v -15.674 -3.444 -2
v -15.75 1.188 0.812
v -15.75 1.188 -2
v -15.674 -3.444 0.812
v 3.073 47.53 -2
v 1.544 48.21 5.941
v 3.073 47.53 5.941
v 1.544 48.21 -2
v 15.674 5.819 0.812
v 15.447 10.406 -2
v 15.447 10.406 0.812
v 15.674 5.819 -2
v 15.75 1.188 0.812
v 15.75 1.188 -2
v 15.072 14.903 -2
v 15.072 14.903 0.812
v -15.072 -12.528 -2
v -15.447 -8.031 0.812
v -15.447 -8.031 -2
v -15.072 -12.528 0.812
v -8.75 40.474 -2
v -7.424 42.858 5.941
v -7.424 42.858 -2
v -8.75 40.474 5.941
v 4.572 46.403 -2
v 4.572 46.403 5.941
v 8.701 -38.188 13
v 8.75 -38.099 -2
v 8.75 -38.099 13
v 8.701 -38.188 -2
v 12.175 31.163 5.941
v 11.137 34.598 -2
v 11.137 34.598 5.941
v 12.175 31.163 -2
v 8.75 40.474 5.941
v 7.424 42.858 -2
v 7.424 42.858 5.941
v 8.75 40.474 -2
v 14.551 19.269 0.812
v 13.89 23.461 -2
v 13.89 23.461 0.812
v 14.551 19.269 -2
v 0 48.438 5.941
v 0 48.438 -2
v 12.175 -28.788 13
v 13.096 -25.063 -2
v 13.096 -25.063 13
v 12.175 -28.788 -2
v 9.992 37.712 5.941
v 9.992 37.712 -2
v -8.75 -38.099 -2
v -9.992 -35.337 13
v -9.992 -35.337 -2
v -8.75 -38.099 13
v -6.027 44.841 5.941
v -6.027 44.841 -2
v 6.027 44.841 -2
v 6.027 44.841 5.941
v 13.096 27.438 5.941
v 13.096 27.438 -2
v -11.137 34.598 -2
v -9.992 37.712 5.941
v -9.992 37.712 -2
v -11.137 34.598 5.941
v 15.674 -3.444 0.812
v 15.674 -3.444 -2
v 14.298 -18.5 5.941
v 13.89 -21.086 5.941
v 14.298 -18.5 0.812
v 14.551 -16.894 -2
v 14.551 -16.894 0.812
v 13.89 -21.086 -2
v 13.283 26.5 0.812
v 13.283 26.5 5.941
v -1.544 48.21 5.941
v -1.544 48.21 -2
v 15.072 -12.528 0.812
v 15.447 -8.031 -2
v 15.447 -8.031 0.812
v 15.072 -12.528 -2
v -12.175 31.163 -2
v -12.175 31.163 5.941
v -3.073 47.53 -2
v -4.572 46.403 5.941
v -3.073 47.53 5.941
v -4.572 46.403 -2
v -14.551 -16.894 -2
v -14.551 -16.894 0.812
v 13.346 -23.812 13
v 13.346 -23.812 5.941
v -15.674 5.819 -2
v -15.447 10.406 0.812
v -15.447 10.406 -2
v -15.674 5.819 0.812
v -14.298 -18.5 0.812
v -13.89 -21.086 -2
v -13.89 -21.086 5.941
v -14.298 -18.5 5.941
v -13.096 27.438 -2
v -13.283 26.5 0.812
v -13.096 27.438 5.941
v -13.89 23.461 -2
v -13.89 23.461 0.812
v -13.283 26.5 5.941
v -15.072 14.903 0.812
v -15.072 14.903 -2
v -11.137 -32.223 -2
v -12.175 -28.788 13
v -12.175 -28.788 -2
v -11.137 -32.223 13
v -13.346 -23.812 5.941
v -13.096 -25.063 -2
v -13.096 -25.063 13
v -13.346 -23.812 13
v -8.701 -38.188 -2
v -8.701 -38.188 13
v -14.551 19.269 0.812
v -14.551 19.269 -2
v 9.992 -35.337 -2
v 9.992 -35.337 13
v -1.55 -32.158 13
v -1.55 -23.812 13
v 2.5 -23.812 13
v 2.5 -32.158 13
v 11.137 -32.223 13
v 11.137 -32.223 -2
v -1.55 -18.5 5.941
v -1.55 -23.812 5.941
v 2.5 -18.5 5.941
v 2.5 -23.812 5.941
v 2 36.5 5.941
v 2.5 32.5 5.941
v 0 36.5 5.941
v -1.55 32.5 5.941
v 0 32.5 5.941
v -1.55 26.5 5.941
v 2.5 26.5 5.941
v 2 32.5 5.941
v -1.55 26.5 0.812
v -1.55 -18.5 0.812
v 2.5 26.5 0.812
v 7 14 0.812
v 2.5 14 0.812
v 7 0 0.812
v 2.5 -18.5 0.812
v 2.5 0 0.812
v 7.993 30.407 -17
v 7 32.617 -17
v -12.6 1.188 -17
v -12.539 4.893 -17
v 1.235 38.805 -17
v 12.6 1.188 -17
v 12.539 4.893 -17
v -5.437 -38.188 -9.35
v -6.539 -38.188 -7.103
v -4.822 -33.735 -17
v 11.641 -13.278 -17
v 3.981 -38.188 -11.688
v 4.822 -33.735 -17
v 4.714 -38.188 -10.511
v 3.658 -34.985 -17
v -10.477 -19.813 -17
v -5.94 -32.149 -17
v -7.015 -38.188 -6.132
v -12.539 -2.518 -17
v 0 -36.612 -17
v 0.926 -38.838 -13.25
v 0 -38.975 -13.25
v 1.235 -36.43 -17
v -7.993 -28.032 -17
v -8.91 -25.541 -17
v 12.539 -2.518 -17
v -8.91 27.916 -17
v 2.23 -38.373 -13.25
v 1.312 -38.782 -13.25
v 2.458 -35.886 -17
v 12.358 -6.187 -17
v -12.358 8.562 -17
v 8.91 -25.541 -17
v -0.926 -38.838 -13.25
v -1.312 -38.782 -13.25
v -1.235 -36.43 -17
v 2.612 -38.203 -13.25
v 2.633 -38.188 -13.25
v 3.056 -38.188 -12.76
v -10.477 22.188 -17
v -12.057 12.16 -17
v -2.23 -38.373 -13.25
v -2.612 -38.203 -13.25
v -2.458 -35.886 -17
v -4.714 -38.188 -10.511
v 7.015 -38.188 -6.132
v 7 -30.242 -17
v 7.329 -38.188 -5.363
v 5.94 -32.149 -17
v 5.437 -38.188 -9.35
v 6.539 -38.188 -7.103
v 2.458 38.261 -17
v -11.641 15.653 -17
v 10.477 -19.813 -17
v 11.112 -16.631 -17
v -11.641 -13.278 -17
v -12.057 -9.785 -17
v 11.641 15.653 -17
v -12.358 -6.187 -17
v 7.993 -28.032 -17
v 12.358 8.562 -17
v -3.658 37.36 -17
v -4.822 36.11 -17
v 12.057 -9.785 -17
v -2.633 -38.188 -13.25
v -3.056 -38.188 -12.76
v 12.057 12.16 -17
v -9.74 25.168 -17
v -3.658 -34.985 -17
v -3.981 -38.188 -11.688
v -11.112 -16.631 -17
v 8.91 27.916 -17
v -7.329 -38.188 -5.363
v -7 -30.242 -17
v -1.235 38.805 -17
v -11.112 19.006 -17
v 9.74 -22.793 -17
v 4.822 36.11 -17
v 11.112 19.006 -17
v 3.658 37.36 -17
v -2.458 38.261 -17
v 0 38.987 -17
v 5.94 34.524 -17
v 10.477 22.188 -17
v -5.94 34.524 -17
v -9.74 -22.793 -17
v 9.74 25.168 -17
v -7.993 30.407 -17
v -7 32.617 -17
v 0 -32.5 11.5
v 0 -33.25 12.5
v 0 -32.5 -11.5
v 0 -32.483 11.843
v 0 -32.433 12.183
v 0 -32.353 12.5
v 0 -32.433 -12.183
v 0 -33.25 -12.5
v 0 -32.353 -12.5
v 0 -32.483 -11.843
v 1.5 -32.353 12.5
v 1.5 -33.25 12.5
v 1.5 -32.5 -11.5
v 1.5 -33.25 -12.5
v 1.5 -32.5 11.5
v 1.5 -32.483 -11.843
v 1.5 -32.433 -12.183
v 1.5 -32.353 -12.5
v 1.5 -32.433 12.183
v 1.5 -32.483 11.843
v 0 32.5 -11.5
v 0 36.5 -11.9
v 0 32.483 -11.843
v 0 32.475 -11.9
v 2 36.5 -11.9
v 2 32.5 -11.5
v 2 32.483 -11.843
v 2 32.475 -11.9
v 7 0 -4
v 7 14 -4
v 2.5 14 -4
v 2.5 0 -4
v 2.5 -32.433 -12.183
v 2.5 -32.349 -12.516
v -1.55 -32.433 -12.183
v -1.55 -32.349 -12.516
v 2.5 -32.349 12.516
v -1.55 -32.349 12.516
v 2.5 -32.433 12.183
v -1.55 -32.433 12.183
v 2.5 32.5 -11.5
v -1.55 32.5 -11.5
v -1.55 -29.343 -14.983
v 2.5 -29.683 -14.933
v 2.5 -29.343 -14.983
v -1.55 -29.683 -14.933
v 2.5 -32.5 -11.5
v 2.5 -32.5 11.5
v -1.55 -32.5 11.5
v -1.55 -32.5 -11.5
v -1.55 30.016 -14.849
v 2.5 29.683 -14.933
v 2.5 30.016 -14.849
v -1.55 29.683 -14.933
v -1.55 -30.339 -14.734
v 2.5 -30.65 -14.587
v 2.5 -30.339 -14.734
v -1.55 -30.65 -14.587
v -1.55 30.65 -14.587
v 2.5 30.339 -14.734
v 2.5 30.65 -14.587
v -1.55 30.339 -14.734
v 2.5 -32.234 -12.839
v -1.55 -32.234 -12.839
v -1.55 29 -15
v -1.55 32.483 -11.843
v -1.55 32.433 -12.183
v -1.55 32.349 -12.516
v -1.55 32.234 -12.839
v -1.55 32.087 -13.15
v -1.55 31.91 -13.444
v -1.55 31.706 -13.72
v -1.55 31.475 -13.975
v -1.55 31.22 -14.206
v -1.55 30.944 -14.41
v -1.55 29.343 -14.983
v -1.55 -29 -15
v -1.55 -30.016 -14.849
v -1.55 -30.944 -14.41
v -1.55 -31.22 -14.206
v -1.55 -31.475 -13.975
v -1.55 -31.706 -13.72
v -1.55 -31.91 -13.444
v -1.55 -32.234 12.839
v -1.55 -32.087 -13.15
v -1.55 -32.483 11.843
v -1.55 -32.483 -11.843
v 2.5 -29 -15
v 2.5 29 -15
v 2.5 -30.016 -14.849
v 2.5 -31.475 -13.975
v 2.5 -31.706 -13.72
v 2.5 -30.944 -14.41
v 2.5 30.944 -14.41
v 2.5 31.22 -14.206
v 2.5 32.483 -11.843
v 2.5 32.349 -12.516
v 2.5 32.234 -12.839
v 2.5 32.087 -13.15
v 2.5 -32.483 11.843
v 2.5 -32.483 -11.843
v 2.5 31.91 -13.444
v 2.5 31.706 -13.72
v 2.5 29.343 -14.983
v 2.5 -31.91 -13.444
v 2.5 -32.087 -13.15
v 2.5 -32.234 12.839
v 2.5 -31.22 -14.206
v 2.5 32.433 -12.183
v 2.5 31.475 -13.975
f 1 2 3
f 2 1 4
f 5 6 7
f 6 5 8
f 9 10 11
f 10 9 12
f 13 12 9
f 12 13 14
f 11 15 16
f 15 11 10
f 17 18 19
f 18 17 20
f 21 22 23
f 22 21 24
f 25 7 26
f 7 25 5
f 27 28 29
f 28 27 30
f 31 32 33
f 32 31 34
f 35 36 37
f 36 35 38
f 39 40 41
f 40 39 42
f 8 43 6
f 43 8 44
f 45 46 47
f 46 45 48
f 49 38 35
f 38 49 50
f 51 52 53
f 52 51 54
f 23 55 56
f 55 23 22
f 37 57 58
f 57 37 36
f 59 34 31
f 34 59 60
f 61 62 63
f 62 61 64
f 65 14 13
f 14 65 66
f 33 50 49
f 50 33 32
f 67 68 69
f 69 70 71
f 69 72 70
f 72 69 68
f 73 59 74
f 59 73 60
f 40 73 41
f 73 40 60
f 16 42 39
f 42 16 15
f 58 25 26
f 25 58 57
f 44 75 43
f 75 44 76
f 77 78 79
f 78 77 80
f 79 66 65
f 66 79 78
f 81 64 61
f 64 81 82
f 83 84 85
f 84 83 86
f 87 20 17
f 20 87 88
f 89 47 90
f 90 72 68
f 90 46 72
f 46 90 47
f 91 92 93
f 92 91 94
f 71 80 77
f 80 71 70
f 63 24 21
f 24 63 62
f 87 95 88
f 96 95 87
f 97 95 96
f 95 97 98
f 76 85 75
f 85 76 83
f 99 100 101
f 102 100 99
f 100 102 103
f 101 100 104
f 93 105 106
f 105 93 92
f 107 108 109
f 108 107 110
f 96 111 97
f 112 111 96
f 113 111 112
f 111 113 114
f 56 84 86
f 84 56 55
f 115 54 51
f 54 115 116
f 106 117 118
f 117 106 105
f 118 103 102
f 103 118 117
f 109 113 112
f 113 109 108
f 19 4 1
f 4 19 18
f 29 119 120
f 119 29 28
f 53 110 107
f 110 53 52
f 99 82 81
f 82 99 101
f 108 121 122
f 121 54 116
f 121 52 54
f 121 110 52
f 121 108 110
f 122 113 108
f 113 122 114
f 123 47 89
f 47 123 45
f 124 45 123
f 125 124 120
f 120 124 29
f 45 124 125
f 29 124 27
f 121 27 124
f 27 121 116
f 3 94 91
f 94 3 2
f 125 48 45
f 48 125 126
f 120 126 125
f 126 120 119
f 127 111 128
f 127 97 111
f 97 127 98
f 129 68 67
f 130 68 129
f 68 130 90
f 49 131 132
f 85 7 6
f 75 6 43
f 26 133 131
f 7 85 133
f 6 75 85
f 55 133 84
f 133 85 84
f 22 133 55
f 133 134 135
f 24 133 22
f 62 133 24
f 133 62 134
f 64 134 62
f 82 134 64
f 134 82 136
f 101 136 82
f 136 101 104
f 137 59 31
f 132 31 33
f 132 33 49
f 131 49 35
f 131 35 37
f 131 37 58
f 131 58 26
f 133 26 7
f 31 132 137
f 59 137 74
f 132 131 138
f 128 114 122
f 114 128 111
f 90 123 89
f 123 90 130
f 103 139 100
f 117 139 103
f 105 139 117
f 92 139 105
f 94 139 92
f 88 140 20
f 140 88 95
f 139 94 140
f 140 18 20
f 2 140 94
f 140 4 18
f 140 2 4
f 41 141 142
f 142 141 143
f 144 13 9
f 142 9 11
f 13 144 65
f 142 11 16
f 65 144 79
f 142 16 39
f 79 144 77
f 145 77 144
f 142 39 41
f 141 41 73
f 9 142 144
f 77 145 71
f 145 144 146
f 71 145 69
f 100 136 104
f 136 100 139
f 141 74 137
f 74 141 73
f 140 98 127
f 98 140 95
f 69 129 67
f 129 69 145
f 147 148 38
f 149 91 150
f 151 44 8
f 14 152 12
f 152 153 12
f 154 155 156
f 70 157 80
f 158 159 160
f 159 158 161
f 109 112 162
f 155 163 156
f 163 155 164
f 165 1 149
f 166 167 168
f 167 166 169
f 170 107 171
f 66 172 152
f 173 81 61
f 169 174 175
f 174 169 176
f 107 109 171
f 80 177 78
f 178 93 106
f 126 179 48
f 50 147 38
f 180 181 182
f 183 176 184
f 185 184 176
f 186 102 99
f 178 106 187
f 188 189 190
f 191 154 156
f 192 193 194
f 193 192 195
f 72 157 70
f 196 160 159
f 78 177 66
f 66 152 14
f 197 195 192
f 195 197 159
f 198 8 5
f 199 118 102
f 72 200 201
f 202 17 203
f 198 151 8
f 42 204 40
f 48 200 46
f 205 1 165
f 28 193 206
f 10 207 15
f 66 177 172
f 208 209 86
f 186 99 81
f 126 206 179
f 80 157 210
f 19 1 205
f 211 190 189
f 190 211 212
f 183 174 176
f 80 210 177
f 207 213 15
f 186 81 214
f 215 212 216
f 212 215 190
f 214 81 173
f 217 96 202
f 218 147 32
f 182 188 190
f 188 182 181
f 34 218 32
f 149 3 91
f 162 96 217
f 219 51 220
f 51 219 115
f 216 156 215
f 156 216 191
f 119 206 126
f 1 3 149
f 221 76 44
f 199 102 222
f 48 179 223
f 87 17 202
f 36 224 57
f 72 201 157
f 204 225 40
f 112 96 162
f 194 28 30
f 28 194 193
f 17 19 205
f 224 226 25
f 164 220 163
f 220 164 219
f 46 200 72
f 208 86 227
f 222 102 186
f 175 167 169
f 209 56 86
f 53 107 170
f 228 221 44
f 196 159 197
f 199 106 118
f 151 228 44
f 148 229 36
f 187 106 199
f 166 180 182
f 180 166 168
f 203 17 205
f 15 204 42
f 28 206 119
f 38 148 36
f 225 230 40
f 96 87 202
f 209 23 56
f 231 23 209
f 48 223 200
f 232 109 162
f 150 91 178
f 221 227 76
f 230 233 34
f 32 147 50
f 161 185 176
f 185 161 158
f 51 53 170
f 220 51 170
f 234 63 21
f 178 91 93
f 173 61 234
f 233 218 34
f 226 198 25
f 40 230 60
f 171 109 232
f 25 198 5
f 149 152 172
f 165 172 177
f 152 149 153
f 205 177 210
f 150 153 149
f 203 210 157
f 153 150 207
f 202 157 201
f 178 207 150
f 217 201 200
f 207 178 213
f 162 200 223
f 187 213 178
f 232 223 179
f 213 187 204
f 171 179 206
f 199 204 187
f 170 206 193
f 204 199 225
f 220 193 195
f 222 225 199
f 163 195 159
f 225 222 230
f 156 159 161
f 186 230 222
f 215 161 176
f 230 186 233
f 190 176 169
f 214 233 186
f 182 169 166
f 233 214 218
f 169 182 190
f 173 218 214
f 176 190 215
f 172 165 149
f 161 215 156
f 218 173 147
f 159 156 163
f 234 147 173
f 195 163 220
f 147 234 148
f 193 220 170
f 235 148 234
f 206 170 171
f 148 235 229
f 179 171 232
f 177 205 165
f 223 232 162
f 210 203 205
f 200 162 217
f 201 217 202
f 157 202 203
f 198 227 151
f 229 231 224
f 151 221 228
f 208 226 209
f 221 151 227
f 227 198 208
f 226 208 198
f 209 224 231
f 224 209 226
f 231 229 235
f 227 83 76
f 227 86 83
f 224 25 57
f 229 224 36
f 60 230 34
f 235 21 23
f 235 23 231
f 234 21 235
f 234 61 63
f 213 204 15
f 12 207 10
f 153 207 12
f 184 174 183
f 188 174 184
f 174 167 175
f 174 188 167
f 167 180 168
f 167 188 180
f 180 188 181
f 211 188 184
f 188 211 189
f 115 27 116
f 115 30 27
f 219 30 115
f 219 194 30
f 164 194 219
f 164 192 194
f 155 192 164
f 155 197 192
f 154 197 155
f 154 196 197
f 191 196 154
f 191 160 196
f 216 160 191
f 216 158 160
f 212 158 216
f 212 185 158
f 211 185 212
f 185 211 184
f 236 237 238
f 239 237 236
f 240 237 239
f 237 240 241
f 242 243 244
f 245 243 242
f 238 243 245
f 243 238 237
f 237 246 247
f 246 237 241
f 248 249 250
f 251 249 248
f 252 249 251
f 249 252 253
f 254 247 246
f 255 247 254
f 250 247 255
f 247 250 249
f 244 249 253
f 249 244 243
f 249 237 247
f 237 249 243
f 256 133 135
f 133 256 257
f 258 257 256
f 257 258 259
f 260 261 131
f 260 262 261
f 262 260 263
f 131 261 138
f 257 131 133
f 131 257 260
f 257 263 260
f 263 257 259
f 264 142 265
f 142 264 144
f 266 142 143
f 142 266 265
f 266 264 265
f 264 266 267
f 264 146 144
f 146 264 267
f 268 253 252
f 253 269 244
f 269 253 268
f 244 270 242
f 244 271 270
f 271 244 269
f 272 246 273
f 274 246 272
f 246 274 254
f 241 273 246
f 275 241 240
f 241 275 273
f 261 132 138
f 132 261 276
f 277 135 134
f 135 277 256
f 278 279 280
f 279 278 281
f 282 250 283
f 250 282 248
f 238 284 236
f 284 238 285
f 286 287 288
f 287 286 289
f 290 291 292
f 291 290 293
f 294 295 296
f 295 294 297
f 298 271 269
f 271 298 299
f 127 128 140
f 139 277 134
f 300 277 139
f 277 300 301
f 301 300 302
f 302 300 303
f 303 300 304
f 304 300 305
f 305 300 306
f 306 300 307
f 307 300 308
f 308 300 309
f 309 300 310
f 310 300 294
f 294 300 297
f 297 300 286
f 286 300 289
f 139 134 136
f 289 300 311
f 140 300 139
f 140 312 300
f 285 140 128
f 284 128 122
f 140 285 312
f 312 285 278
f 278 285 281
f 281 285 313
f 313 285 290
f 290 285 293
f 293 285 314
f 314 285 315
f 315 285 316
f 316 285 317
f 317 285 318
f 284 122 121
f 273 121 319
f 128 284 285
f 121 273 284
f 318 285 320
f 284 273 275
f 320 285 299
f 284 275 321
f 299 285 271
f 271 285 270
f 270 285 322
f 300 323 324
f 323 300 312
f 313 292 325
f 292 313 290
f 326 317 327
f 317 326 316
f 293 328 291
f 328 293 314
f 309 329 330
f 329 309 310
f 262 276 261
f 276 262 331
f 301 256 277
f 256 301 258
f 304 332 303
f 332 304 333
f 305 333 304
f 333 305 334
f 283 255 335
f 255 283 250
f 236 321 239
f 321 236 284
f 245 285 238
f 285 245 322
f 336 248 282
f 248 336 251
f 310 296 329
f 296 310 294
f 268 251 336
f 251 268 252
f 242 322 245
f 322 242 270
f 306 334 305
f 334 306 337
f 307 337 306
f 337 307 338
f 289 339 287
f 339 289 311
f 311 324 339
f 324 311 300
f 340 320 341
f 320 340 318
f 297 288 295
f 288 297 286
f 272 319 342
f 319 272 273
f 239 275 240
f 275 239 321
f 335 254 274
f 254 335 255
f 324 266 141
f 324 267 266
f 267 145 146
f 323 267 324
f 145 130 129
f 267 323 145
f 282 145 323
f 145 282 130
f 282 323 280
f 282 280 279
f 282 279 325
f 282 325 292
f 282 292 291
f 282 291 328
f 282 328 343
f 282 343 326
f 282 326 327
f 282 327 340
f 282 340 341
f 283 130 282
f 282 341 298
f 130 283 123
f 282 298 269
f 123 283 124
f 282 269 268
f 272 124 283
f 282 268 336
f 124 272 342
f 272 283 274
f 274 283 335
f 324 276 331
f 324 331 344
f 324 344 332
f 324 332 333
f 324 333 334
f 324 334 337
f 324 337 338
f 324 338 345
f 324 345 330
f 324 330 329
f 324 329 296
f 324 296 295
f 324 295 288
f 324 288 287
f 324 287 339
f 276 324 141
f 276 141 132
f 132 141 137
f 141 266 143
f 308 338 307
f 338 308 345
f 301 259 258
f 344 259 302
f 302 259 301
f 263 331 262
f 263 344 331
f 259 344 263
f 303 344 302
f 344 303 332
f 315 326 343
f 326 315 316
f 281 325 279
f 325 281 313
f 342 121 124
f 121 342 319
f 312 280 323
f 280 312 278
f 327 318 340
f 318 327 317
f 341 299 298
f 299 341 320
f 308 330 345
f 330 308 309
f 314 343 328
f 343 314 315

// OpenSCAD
// file: pi-zero.scad
include <rounded-rect.scad>;

// piZero();

module piZero(includeCables = true, includeHeatsink = true, heightPadding = 0, sdWidth = 12, cameraWidth = 17, printerTolerance = 0) {
    // base board
    color("green")
        linear_extrude(0, 0, 1.55 + 2 + heightPadding + printerTolerance)
            difference() {
                roundedRect(30 + 2 * printerTolerance, 65 + 2 * printerTolerance, 3.5 -printerTolerance);
                *union() {
                    translate([11.5 + printerTolerance, 29 + printerTolerance, 0]) circle(r = 1.25 - printerTolerance);
                    translate([-11.5 - printerTolerance, 29 + printerTolerance, 0]) circle(r = 1.25 - printerTolerance);
                    translate([11.5 + printerTolerance, -29 - printerTolerance, 0]) circle(r = 1.25 - printerTolerance);
                    translate([-11.5 - printerTolerance, -29 - printerTolerance, 0]) circle(r = 1.25 - printerTolerance);
                };
            };
    // top stuff
    translate([0, 0, 1.55 + printerTolerance])
        color("cyan")
            union() {
                // camera port cover
                linear_extrude(0, 0, 1 + heightPadding + printerTolerance)
                    translate([0, -32.5 - printerTolerance, 0])
                        square([cameraWidth + 2 * printerTolerance, 1.5 + 2 * printerTolerance], center = true);
                // micro usb ports
                translate([-10, -8.9, 1])
                    rotate([0, -90, 0])
                        linear_extrude(0, 0, 6)
                            square([2 + 2 * printerTolerance, 8 + 2 * printerTolerance], center = true);
                translate([-10, -21.5, 1])
                    rotate([0, -90, 0])
                        linear_extrude(0, 0, 6)
                            square([2 + 2 * printerTolerance, 8 + 2 * printerTolerance], center = true);
                // micro usb port things
                if (includeCables) {
                    translate([-15, -8.9, 1])
                        rotate([0, -90, 0])
                            linear_extrude(0, 0, 8)
                                roundedRect(8, 11, 1);
                    translate([-15, -21.5, 1])
                        rotate([0, -90, 0])
                            linear_extrude(0, 0, 8)
                                roundedRect(8, 11, 1);
                }
                // micro hdmi port
                translate([-7, 20.1, 1.7])
                    rotate([0, -90, 0])
                        linear_extrude(0, 0, 9.5)
                            square([3.4 + 2 * printerTolerance, 11.5 + 2 * printerTolerance], center = true);
                // micro hdmi adapter
                if (includeCables) {
                    translate([-15, 20.1, 1.7])
                        rotate([0, -90, 0])
                            linear_extrude(0, 0, 9.5)
                                roundedRect(9 + 2 * printerTolerance, 14 + 2* printerTolerance, 2);
                }
                
                // microsd card
                translate([1.9, 28, 0])
                    linear_extrude(0, 0, 1.5 + heightPadding)
                        square([sdWidth + 2 * printerTolerance, 17 + 2 * printerTolerance], center = true);
                // cpu heatsink
                translate([-3, 32.5 - 18.5 - 7, 0])
                    linear_extrude(0, 0, 7)
                        square([14, 14], center = true);
            };
}
// file: rounded-rect.scad
$fn = 16;

// linear_extrude(0, 0, 1) roundedRect(10, 20, 2);

module roundedRect(w, h, r) {
    square([w - 2 * r, h], center = true);
    square([w, h - 2 * r], center = true);
    translate([w/2 - r, h/2 - r, 0]) circle(r = r);
    translate([-(w/2 - r), h/2 - r, 0]) circle(r = r);
    translate([w/2 - r, -(h/2 - r), 0]) circle(r = r);
    translate([-(w/2 - r), -(h/2 - r), 0]) circle(r = r);
}
// main file
include <rounded-rect.scad>;
include <pi-zero.scad>;

printerTolerance = 0.3;
$fn = 64;

// pi zero, horizontally
//difference() {
//    union() {
//        linear_extrude(0, 0, 3)
//            roundedRect(32, 67, 3.5);
//        translate([0, 0, 6]) hull(120);
//    };
//    translate([0, 0, 1])
//        piZero(heightPadding = 20);
//    // cut off anything below
//    translate([0, 0, -8])
//        rotate([180, 0, 0])
//            linear_extrude(0, 0, 50)
//                square(200, center = true);
////    translate([-10, -27.5, 0])
////        linear_extrude(0, 0, 3)
////            stripeBlock(20, 55, 2);
//};

difference() {
    translate([0, 4, -2]) hull(90);
    translate([-1.55, 0, 0]) rotate([0, 90, 0])
        piZero(heightPadding = 0.5, sdWidth = 20, cameraWidth=25);
}

module stripeBlock(w, h, stripeSpacing = 2) {
    intersection() {
        for (i = [2:2:(w + h)]) {
            polygon([
                [(i - 1) * stripeSpacing, 0],
                [i * stripeSpacing, 0],
                [0, i * stripeSpacing],
                [0, (i - 1) * stripeSpacing]
            ]);
        };
        square([w, h]);
    };
}


module hull(hl)
{
    color("brown")
    difference() {
        translate([0,hl*-1/32,-hl*0/32])
            union() {
                scale([0.7,2.1,1]) translate([0,0,-hl/12]) 
                    cylinder(r1=hl/5, r2=hl/4, h=hl/6,center=true);
                difference() {
                    scale([0.7,2.1,1]) translate([0,0,hl/12]) 
                        cylinder(r=hl/4, h=hl/6, center=true);
                    translate([0,hl/4.5,hl/1.7]) cube(hl, center=true);
                    translate([0,hl*1/32,hl*9/32]) cube(hl/2, center=true);
                }
            }
        translate([0,-hl*17/32,4*hl/32]) cube([hl,hl/8,hl/2],center=true);
    }
}
	
